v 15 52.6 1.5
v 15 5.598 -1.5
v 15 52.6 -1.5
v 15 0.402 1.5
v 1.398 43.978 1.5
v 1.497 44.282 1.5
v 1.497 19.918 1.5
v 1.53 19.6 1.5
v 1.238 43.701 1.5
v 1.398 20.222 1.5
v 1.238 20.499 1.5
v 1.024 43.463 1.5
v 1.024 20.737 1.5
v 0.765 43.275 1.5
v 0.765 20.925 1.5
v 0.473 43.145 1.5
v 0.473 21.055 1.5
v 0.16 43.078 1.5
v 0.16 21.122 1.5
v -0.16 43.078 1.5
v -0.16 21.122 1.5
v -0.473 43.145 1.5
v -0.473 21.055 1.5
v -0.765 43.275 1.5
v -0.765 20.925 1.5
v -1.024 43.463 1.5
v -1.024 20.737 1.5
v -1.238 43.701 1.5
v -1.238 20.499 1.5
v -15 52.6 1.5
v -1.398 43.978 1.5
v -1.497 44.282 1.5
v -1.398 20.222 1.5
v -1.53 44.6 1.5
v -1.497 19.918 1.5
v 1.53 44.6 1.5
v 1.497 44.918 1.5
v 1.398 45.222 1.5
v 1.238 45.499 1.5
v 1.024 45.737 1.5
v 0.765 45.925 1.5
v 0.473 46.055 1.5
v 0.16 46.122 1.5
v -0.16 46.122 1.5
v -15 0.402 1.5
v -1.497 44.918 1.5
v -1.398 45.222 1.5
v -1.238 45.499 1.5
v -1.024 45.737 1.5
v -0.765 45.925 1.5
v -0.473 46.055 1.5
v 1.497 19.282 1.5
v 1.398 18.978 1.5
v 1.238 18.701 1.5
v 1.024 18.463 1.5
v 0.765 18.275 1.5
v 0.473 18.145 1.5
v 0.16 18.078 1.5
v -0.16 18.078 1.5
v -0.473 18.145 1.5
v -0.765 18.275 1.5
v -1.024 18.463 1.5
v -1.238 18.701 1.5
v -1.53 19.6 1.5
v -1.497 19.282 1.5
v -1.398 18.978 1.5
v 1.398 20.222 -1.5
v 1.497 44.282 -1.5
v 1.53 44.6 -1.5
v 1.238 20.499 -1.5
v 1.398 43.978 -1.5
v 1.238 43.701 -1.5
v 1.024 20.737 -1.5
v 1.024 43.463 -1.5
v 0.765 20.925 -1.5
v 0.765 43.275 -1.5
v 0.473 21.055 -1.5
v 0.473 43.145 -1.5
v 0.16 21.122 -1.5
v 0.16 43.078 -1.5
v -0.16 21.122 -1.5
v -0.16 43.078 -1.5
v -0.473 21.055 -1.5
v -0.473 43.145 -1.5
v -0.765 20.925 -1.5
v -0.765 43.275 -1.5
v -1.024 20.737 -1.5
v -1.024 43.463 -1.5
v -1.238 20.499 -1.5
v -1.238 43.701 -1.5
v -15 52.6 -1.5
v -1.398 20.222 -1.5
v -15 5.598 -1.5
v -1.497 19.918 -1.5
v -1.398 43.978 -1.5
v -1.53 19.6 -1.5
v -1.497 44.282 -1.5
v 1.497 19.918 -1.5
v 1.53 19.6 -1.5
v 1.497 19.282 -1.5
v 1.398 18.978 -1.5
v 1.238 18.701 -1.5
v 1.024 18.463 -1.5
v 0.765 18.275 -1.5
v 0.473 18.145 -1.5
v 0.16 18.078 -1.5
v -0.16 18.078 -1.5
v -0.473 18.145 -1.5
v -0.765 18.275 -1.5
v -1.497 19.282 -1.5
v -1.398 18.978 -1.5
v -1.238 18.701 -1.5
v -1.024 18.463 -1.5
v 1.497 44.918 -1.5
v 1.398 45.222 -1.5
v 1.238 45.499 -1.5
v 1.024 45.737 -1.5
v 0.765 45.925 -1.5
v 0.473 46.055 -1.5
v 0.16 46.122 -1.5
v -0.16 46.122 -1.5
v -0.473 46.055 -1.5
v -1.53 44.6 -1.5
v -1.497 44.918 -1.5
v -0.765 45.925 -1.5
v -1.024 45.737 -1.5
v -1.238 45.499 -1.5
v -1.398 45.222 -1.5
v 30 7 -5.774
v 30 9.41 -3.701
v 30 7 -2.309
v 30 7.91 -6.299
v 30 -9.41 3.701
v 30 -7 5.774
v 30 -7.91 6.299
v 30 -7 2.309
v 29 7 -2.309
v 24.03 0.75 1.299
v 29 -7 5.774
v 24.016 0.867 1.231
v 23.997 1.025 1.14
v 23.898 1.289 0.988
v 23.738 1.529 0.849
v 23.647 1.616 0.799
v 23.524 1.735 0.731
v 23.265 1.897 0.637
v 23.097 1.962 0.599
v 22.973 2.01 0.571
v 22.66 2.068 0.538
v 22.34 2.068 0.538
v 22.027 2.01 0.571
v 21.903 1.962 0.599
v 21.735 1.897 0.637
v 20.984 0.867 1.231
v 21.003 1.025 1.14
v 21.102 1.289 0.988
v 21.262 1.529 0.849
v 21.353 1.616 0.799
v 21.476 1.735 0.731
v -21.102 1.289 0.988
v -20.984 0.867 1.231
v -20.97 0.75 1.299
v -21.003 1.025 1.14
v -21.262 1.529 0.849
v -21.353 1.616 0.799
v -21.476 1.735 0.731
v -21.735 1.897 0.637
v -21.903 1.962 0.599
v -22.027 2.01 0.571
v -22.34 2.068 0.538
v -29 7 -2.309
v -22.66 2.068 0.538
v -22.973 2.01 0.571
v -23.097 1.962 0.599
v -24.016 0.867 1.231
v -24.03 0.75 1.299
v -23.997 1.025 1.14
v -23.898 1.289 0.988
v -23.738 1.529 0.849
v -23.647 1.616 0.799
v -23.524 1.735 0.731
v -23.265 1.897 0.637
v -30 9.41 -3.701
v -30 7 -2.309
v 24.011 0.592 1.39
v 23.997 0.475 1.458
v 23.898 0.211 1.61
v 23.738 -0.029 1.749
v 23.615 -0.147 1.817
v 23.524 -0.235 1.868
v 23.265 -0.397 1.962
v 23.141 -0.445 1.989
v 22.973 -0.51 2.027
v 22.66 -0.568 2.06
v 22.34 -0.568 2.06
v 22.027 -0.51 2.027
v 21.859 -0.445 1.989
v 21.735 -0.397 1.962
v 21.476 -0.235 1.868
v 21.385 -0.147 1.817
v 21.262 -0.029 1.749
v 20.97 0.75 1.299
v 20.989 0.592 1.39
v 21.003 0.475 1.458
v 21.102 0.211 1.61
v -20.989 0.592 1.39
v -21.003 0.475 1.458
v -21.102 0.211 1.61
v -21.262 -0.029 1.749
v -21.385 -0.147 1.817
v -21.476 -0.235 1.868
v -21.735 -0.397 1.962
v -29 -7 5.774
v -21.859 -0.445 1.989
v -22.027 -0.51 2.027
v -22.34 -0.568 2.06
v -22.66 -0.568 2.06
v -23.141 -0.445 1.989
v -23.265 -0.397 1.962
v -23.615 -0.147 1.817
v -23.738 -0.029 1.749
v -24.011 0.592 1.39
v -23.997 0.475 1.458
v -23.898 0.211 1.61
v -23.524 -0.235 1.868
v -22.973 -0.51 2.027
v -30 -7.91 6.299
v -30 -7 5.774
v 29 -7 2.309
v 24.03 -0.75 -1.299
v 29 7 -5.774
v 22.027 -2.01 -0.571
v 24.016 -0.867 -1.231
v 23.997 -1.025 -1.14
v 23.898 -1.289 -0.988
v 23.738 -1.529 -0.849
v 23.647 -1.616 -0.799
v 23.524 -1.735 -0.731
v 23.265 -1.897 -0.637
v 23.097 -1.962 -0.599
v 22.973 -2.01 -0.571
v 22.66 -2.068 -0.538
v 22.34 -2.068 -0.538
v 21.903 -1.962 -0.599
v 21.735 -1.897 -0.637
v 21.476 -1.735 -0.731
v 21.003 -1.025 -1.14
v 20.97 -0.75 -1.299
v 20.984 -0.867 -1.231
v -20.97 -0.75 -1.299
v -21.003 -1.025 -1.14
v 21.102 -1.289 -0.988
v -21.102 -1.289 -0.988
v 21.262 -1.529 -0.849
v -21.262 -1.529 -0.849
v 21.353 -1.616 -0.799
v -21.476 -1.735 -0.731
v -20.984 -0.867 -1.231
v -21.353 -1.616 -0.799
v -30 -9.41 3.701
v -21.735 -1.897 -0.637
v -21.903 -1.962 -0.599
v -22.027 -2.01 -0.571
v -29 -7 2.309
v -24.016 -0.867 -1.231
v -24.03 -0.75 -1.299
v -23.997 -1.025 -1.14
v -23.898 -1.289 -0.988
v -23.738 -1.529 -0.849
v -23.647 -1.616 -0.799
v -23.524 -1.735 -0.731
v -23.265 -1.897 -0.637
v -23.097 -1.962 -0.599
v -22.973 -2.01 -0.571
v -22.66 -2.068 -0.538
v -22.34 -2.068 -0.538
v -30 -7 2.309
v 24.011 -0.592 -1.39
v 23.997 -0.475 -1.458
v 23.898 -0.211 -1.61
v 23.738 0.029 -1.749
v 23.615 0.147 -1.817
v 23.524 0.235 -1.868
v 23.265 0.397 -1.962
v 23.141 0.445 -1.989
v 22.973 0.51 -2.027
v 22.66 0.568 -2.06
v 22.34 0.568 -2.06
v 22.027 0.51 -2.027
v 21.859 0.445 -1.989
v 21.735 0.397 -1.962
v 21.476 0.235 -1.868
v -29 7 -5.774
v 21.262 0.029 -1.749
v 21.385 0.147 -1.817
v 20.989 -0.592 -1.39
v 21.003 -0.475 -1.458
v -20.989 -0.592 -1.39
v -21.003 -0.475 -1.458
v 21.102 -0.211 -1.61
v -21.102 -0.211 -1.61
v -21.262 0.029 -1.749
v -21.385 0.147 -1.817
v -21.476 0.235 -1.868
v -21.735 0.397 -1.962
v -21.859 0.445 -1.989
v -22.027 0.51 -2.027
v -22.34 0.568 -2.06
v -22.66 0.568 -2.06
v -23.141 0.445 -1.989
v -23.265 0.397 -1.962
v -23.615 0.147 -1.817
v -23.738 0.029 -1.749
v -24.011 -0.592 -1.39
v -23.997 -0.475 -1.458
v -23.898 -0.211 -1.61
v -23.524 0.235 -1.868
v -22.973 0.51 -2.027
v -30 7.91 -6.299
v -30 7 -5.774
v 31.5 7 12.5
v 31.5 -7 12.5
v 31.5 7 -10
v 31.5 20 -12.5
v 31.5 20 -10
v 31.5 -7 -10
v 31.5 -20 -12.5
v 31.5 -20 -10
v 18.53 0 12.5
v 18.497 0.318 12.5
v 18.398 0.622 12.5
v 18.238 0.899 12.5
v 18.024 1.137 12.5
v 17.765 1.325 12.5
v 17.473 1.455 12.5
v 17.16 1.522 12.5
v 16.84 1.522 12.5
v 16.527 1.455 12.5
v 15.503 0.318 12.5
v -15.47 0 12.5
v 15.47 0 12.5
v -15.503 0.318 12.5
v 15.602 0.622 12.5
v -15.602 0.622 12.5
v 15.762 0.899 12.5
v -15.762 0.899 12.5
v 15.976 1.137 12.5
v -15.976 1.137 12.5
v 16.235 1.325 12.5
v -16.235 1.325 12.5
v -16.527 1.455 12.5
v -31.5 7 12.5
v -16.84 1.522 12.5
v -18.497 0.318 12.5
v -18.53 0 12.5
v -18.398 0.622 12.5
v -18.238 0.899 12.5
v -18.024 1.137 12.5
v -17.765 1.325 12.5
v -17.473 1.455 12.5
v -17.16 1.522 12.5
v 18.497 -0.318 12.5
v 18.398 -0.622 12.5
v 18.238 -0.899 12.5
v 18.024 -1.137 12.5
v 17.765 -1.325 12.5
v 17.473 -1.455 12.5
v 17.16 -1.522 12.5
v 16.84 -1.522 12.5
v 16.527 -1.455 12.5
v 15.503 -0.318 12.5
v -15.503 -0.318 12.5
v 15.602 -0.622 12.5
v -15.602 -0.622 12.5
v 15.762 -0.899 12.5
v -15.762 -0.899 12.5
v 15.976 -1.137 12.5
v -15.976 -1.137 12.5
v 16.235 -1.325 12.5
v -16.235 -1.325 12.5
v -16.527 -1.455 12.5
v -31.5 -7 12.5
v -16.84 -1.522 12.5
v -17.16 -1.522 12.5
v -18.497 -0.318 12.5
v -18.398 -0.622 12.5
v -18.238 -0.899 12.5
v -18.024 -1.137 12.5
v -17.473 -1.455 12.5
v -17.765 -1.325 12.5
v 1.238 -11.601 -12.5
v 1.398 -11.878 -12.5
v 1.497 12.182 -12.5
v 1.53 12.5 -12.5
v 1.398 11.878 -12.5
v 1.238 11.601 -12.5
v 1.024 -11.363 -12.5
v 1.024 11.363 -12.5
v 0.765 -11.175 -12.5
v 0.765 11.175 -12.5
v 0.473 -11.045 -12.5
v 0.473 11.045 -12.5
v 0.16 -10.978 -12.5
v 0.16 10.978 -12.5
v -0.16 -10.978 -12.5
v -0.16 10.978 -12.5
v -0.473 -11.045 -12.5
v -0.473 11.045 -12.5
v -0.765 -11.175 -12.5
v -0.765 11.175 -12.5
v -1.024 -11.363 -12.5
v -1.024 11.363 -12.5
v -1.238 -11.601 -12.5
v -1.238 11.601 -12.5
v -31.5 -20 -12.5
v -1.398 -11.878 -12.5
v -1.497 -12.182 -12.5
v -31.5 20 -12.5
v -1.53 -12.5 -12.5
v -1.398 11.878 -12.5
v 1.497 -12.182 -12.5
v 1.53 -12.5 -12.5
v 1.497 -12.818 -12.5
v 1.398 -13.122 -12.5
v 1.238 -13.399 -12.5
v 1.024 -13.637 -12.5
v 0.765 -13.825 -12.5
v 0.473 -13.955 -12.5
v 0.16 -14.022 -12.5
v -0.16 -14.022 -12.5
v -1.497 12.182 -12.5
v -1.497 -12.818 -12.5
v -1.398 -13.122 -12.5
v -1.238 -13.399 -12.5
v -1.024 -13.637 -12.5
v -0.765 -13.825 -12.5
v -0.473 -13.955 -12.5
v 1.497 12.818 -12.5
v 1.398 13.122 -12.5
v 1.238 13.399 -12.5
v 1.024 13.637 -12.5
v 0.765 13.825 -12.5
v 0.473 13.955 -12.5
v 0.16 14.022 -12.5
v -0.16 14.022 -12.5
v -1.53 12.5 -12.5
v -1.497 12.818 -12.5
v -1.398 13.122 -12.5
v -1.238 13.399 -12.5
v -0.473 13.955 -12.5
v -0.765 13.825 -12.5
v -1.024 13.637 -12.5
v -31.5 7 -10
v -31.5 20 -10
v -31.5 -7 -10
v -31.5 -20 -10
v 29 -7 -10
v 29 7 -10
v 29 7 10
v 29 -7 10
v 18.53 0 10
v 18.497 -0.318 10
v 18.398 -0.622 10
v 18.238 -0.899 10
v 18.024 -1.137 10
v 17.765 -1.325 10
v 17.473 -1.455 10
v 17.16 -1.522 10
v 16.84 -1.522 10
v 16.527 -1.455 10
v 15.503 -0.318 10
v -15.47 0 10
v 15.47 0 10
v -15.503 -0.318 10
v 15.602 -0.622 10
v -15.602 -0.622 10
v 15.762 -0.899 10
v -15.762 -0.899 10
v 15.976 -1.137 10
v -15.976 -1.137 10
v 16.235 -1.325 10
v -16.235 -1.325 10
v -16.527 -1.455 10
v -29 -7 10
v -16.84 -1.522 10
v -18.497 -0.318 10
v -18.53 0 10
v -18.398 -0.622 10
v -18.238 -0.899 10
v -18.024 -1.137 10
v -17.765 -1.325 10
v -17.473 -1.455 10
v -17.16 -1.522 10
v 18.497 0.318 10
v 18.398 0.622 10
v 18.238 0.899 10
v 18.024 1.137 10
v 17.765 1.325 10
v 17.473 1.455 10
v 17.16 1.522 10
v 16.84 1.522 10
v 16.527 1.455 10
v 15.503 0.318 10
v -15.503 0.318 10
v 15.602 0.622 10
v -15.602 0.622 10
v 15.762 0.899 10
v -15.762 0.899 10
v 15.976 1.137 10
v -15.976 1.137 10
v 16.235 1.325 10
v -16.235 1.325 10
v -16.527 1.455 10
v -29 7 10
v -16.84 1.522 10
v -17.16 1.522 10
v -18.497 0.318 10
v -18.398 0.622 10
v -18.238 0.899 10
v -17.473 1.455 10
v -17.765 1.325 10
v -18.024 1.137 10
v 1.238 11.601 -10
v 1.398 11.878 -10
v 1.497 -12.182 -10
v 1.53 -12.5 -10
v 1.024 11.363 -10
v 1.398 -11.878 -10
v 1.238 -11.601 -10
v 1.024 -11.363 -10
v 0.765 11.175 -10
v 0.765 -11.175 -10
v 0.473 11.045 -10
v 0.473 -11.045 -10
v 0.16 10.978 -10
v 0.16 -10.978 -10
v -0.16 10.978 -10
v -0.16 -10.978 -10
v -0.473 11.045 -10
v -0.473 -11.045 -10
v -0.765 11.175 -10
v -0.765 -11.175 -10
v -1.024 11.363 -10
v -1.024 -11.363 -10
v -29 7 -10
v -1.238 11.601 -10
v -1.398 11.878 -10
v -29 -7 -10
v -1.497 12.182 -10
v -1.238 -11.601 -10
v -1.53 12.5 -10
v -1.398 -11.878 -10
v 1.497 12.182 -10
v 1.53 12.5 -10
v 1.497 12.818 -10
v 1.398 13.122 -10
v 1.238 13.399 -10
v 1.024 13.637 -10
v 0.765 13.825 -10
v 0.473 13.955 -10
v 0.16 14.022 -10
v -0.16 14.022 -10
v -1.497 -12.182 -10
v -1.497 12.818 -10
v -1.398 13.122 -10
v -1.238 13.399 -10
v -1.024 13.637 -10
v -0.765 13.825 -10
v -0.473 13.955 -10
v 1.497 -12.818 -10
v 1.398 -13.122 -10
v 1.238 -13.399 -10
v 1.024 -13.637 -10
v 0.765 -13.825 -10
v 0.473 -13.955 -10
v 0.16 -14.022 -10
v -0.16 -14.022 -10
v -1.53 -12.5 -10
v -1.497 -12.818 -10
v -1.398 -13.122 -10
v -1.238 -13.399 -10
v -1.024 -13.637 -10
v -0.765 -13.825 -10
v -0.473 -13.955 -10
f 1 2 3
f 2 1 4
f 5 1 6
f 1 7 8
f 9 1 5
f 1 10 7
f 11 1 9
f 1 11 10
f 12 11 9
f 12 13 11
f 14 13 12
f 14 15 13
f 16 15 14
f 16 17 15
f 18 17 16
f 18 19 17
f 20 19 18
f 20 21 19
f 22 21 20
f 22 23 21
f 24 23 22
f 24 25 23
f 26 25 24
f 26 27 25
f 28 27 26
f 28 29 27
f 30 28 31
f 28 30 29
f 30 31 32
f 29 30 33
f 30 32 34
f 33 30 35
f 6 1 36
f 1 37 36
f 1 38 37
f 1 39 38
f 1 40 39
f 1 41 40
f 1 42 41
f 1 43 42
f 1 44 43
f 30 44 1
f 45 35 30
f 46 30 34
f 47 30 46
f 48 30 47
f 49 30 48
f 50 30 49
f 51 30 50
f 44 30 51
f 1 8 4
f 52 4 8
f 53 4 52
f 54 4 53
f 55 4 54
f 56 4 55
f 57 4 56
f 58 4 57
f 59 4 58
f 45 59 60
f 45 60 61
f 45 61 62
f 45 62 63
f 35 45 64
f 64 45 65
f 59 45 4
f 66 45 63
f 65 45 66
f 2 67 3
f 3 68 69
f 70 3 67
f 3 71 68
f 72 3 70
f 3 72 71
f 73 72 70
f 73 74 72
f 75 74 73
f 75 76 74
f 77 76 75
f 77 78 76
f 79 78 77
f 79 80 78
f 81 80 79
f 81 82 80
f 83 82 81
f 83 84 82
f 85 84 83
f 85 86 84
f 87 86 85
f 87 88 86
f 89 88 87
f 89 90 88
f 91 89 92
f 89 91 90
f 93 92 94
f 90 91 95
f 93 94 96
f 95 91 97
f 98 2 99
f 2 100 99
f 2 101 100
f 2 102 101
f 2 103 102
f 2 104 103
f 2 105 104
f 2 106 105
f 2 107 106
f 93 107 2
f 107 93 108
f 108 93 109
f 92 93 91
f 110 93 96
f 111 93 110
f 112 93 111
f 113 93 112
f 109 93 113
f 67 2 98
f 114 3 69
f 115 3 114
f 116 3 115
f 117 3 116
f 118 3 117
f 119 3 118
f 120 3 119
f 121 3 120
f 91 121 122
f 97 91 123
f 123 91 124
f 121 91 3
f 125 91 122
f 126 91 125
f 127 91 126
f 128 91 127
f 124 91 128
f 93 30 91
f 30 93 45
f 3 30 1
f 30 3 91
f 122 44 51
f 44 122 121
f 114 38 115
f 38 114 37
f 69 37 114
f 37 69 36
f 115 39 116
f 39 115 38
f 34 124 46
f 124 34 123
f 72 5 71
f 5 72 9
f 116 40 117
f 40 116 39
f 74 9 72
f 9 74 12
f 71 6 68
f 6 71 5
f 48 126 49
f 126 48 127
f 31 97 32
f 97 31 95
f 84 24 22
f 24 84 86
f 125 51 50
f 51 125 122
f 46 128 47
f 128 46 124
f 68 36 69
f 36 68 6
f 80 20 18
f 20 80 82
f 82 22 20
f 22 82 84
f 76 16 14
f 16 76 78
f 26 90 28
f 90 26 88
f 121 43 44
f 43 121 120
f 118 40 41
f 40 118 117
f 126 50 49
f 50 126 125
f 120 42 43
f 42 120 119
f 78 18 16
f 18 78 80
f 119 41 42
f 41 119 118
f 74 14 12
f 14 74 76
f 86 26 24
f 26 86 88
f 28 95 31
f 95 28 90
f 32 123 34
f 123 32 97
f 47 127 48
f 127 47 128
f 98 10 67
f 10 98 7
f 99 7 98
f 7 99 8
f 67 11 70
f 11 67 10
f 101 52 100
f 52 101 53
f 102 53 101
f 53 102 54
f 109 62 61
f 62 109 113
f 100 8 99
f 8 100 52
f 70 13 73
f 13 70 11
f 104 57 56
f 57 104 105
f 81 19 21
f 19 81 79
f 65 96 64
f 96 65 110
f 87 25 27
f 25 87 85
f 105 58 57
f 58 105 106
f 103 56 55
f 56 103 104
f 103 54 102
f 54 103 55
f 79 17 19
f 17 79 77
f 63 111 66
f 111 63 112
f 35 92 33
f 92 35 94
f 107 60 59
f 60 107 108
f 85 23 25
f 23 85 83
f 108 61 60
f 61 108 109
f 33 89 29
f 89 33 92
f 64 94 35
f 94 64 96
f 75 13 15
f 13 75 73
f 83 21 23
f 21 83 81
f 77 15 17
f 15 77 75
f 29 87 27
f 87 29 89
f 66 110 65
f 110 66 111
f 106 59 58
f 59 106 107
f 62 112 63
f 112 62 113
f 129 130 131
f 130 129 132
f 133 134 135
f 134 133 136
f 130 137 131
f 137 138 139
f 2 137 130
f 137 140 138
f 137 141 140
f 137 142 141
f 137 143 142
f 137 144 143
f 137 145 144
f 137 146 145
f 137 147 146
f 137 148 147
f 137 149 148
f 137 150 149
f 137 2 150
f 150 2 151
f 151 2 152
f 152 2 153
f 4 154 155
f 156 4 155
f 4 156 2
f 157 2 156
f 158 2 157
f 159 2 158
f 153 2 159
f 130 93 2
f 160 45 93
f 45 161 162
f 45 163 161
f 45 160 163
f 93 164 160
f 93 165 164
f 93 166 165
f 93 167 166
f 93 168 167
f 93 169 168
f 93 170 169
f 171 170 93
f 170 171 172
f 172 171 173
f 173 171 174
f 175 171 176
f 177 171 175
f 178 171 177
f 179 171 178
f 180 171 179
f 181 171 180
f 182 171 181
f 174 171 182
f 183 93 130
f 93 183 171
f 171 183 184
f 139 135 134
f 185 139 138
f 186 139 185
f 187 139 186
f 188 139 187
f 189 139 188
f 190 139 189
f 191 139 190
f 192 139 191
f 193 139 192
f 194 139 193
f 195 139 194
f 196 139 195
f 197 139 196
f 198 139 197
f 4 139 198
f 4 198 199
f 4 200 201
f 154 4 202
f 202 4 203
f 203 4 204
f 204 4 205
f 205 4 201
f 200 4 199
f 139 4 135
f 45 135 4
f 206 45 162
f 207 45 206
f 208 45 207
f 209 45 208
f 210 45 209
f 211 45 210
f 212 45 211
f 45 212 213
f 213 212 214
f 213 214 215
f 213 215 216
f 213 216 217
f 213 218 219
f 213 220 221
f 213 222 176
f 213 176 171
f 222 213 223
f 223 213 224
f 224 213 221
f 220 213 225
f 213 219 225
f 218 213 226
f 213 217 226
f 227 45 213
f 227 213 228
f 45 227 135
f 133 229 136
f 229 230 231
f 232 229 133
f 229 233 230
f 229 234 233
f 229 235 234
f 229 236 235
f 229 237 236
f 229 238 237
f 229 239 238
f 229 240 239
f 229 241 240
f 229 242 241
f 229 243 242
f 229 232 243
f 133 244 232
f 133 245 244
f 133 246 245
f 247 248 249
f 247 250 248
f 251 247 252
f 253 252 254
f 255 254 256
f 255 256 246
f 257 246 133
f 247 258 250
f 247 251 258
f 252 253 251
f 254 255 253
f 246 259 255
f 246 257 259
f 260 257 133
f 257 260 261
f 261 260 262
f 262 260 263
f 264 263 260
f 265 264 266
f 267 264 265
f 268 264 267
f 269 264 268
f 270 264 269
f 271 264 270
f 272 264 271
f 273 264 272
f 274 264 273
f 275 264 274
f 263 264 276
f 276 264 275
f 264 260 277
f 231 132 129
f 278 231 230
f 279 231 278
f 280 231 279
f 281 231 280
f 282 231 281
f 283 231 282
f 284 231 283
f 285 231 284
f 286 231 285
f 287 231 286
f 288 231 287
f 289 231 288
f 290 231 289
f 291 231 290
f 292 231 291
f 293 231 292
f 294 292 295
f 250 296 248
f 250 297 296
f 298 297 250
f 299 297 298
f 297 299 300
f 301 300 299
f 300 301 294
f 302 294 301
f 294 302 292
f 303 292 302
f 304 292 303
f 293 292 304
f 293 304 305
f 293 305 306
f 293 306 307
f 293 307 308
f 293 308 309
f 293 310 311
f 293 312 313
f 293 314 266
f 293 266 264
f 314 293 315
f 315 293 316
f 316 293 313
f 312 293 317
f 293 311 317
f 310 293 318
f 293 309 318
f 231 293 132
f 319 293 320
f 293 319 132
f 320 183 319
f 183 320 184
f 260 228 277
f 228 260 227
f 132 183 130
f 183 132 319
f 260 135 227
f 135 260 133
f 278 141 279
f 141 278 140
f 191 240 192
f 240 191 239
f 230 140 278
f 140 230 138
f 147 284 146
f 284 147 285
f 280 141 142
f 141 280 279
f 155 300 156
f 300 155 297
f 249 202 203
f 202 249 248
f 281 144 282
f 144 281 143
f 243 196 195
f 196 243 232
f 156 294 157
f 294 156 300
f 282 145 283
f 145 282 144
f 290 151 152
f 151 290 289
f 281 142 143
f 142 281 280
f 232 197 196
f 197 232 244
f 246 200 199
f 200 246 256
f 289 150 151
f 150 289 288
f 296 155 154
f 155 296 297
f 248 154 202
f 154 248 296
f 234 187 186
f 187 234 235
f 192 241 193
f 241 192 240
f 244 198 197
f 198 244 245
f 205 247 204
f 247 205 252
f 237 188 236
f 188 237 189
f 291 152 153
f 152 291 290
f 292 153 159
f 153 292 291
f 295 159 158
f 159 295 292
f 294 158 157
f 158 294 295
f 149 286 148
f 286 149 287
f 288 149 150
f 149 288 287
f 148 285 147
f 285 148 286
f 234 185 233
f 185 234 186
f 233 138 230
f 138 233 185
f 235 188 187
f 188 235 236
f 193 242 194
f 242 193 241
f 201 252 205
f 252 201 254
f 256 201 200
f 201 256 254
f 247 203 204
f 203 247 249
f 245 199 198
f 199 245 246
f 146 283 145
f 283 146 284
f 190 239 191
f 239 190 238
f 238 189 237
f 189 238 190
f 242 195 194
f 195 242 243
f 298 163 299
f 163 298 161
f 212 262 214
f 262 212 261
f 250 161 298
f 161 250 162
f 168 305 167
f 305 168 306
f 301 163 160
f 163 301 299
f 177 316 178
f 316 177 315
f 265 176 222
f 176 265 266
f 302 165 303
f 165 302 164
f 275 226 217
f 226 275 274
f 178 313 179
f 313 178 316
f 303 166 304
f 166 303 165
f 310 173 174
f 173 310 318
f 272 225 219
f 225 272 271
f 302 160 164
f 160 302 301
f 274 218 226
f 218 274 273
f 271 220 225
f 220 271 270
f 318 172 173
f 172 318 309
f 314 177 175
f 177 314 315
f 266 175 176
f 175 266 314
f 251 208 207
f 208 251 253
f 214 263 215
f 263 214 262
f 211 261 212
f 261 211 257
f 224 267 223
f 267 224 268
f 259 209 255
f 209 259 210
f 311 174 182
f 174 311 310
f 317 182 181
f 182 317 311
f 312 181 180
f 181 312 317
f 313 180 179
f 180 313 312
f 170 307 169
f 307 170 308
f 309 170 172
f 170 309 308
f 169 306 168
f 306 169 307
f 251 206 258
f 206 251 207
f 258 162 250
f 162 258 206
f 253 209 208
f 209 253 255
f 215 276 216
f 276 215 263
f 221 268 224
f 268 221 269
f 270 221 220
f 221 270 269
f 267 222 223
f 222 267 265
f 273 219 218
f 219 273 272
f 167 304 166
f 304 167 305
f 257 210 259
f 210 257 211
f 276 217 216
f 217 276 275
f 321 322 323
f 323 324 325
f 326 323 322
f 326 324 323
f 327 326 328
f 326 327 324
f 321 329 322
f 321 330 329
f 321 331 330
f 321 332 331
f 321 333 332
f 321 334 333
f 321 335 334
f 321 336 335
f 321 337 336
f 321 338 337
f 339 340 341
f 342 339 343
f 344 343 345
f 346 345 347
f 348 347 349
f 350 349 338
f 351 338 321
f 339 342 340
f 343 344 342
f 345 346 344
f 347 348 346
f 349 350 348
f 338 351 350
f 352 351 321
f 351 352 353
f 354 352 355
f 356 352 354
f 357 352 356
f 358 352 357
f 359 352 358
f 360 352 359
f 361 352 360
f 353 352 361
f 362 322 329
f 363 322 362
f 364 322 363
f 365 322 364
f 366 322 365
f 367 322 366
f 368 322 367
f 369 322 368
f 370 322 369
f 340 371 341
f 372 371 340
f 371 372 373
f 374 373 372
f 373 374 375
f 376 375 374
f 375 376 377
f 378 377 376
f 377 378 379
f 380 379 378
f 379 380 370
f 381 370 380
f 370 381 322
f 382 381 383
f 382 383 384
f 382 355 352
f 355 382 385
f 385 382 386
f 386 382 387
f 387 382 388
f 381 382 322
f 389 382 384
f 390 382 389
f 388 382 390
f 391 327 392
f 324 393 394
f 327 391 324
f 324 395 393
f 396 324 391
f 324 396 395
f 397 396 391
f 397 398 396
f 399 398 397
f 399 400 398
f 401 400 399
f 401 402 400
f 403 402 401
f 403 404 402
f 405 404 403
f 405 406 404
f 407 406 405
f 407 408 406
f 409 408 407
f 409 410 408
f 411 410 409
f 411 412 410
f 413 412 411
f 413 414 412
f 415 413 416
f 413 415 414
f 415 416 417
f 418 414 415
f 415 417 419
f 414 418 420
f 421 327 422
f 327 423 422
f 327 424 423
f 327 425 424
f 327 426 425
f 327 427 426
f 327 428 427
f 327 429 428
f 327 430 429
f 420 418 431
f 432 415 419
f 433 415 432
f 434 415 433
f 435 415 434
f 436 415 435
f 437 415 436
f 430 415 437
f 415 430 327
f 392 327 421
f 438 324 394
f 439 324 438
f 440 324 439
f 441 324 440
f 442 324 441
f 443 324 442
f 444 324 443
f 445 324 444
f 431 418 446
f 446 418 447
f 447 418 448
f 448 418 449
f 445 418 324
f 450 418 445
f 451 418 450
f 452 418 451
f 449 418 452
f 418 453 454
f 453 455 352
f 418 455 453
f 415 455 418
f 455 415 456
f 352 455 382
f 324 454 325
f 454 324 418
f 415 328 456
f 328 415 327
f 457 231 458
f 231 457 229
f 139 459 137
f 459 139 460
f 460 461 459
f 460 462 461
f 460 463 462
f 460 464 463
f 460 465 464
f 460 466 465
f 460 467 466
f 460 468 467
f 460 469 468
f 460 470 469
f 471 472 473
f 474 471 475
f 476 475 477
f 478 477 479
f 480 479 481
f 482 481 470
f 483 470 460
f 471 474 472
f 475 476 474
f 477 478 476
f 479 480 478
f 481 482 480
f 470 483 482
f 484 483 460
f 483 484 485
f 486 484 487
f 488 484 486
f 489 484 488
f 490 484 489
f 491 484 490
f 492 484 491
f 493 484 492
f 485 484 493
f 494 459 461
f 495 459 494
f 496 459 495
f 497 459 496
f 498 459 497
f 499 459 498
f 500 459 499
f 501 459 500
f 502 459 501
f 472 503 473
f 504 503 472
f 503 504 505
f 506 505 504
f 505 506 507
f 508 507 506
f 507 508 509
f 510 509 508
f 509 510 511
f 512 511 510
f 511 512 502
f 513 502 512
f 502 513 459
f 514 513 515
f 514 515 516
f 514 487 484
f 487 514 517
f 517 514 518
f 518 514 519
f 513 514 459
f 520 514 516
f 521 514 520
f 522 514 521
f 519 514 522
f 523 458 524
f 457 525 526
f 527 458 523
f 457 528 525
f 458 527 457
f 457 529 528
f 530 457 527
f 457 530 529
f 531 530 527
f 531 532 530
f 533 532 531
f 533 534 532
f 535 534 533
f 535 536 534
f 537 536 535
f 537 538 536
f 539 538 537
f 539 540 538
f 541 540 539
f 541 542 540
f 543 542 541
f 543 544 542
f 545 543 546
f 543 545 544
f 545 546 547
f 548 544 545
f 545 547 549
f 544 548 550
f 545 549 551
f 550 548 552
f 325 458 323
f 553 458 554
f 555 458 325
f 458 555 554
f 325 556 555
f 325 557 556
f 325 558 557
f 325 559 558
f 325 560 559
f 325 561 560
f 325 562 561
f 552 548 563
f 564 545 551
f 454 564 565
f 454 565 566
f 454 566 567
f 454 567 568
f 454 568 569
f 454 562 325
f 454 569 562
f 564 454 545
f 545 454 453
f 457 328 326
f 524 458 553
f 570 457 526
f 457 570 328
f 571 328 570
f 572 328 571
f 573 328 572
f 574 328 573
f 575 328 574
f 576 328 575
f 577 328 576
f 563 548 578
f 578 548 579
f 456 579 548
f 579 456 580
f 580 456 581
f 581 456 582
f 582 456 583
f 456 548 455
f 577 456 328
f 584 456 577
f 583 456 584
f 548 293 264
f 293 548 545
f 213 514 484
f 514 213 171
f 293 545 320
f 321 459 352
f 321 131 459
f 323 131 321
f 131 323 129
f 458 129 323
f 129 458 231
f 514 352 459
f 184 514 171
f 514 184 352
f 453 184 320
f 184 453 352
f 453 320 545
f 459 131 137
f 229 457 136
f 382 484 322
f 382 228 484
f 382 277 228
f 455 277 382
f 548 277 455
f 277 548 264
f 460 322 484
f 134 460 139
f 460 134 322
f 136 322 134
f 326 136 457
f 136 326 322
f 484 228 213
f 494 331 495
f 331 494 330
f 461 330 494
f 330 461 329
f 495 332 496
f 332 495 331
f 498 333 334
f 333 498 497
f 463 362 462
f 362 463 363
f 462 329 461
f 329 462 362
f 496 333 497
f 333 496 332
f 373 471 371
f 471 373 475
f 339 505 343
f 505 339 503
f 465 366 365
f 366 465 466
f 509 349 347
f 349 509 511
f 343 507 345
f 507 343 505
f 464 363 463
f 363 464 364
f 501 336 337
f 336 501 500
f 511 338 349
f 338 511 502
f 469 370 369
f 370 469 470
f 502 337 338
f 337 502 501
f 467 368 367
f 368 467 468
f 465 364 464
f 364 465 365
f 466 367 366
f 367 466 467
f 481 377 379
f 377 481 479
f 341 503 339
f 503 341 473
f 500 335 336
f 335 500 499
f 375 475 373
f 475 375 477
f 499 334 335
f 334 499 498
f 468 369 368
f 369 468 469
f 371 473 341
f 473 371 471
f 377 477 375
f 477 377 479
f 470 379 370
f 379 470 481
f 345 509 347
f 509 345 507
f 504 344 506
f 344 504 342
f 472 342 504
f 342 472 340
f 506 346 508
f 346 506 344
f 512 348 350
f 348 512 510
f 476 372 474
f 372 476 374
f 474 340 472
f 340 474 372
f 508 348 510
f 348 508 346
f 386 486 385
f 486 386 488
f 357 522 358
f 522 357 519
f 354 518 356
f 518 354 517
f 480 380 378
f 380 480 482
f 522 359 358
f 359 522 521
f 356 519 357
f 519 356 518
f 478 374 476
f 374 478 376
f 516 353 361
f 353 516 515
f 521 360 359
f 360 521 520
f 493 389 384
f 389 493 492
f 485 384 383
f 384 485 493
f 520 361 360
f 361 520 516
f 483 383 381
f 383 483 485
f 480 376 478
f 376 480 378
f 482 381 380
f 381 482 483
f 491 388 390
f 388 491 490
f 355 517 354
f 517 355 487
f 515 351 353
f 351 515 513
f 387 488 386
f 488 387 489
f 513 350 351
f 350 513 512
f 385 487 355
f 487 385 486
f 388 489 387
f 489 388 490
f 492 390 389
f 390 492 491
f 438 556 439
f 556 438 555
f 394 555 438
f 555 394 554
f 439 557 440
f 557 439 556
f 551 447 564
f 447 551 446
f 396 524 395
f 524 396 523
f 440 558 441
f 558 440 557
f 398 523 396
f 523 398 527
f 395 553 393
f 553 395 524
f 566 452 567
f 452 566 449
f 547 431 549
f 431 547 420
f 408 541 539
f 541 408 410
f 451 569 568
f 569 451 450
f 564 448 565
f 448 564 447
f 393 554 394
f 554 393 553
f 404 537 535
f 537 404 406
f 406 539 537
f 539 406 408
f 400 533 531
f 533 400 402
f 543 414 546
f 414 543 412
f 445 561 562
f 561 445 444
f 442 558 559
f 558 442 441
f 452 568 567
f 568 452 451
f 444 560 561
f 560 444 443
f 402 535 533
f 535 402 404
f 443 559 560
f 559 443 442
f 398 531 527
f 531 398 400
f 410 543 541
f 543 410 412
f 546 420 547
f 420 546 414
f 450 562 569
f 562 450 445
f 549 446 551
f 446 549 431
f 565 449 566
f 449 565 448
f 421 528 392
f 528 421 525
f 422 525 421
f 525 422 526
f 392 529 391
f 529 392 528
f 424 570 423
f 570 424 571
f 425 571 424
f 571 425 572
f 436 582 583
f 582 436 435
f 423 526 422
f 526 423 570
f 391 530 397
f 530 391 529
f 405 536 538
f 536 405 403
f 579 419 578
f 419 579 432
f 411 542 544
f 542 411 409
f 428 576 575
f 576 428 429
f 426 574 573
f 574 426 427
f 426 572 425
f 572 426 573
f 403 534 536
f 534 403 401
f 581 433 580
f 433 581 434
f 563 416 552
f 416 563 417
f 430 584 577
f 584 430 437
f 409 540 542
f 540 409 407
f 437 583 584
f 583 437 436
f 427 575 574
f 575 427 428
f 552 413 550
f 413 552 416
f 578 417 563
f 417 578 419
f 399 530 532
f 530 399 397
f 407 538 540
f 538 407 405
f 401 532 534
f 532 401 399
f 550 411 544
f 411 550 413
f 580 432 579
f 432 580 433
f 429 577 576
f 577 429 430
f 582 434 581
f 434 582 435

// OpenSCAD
// file: camera_mount.scad
module camera_mount() {
  cam_angle = 60.0;
  over_hang_holes_w = 34.0;
  bottom_hang_holes_w = 25.0;
  rs_mount_holes_w = 45.0;

  mount_w = 30.0;
  mount_l = 53.0;
  mount_thickness = 3.0;

  tolerance = 1.02;
  mount_screw_size = 3.0;
  mount_screw_safe_size = mount_screw_size * tolerance;
  cam_mount_buffer_size = mount_screw_safe_size * 1.6;

  union() {
    // Mount body
    translate([0.0, 26.1, 0.0])
    difference() {
      cube([mount_w, mount_l, mount_thickness], center=true);

      // Mount holes
      translate([0.0, 6.0, 0.0])
        translate([0.0, bottom_hang_holes_w / 2.0, 0.0])
          cylinder(r=mount_screw_safe_size/2, h=20, center=true);

      translate([0.0, 6.0, 0.0])
        translate([0.0, -bottom_hang_holes_w / 2.0, 0.0])
          cylinder(r=mount_screw_safe_size/2, h=20, center=true);
    }

    // Camera bracket body
    difference() {
      rotate([-90.0 + cam_angle, 0.0, 0.0])
        cube([60, 20, mount_thickness], center=true);

      // Mount holes
      rotate([-90.0 + cam_angle, 0.0, 0.0])
        translate([rs_mount_holes_w / 2.0, 0.0, 0.0])
          cylinder(r=mount_screw_safe_size/2, h=20, center=true);

      rotate([-90.0 + cam_angle, 0.0, 0.0])
        translate([-rs_mount_holes_w / 2.0, 0.0, 0.0])
          cylinder(r=mount_screw_safe_size/2, h=20, center=true);
    }

    // // Mount hole buffer
    // difference() {
    //   rotate([-90.0 + cam_angle, 0.0, 0.0])
    //     translate([-rs_mount_holes_w / 2.0, 0.0, mount_thickness / 2 + 1])
    //       cylinder(r=cam_mount_buffer_size / 2, h=2, center=true);
    //
    //   rotate([-90.0 + cam_angle, 0.0, 0.0])
    //     translate([-rs_mount_holes_w / 2.0, 0.0, mount_thickness / 2 + 1])
    //       cylinder(r=mount_screw_safe_size / 2, h=2, center=true);
    // }
    // difference() {
    //   rotate([-90.0 + cam_angle, 0.0, 0.0])
    //     translate([rs_mount_holes_w / 2.0, 0.0, mount_thickness / 2 + 1])
    //       cylinder(r=cam_mount_buffer_size / 2, h=2, center=true);
    //
    //   rotate([-90.0 + cam_angle, 0.0, 0.0])
    //     translate([rs_mount_holes_w / 2.0, 0.0, mount_thickness / 2 + 1])
    //       cylinder(r=mount_screw_safe_size / 2, h=2, center=true);
    // }
  }
}

$fn = 30;
camera_mount();
// main file
module overhang_mount() {
  mount_w = 58.0;
  mount_l = 40.0;
  mount_h = 25.0;
  mount_thickness = 5.0;

  tolerance = 1.02;
  mount_screw_size = 3.0;
  mount_screw_safe_size = mount_screw_size * tolerance;
  btm_mount_screw_size = 2.0;
  btm_mount_screw_safe_size = mount_screw_size * tolerance;

  over_hang_holes_w = 34.0;
  bottom_hang_holes_w = 25.0;

  difference() {
    // Main body
    cube([mount_w + mount_thickness,
          mount_l,
          mount_h], center=true);

    // Overhang cutout
    cube([mount_w,
          mount_l + mount_thickness,
          mount_h - mount_thickness], center=true);

    // Reduce cutout
    translate([0.0, 14.0, mount_thickness / 2.0])
      cube([mount_w + mount_thickness,
            14,
            mount_h], center=true);

    translate([0.0, -14.0, mount_thickness / 2.0])
      cube([mount_w + mount_thickness,
            14,
            mount_h], center=true);

    // Overhang mount holes
    translate([over_hang_holes_w / 2.0, 0.0, 12.0])
      cylinder(r=mount_screw_safe_size/2, h=20, center=true);
    translate([-over_hang_holes_w / 2.0, 0.0, 12.0])
      cylinder(r=mount_screw_safe_size/2, h=20, center=true);

    // Bottom mount holes
    translate([0.0, bottom_hang_holes_w / 2.0, -10.0])
      cylinder(r=btm_mount_screw_safe_size/2, h=20, center=true);
    translate([0.0, -bottom_hang_holes_w / 2.0, -10.0])
      cylinder(r=btm_mount_screw_safe_size/2, h=20, center=true);
  }
}

include <camera_mount.scad>
$fn = 30;
overhang_mount();

// translate([0.0, -32.0, -14.0])
//   camera_mount();
